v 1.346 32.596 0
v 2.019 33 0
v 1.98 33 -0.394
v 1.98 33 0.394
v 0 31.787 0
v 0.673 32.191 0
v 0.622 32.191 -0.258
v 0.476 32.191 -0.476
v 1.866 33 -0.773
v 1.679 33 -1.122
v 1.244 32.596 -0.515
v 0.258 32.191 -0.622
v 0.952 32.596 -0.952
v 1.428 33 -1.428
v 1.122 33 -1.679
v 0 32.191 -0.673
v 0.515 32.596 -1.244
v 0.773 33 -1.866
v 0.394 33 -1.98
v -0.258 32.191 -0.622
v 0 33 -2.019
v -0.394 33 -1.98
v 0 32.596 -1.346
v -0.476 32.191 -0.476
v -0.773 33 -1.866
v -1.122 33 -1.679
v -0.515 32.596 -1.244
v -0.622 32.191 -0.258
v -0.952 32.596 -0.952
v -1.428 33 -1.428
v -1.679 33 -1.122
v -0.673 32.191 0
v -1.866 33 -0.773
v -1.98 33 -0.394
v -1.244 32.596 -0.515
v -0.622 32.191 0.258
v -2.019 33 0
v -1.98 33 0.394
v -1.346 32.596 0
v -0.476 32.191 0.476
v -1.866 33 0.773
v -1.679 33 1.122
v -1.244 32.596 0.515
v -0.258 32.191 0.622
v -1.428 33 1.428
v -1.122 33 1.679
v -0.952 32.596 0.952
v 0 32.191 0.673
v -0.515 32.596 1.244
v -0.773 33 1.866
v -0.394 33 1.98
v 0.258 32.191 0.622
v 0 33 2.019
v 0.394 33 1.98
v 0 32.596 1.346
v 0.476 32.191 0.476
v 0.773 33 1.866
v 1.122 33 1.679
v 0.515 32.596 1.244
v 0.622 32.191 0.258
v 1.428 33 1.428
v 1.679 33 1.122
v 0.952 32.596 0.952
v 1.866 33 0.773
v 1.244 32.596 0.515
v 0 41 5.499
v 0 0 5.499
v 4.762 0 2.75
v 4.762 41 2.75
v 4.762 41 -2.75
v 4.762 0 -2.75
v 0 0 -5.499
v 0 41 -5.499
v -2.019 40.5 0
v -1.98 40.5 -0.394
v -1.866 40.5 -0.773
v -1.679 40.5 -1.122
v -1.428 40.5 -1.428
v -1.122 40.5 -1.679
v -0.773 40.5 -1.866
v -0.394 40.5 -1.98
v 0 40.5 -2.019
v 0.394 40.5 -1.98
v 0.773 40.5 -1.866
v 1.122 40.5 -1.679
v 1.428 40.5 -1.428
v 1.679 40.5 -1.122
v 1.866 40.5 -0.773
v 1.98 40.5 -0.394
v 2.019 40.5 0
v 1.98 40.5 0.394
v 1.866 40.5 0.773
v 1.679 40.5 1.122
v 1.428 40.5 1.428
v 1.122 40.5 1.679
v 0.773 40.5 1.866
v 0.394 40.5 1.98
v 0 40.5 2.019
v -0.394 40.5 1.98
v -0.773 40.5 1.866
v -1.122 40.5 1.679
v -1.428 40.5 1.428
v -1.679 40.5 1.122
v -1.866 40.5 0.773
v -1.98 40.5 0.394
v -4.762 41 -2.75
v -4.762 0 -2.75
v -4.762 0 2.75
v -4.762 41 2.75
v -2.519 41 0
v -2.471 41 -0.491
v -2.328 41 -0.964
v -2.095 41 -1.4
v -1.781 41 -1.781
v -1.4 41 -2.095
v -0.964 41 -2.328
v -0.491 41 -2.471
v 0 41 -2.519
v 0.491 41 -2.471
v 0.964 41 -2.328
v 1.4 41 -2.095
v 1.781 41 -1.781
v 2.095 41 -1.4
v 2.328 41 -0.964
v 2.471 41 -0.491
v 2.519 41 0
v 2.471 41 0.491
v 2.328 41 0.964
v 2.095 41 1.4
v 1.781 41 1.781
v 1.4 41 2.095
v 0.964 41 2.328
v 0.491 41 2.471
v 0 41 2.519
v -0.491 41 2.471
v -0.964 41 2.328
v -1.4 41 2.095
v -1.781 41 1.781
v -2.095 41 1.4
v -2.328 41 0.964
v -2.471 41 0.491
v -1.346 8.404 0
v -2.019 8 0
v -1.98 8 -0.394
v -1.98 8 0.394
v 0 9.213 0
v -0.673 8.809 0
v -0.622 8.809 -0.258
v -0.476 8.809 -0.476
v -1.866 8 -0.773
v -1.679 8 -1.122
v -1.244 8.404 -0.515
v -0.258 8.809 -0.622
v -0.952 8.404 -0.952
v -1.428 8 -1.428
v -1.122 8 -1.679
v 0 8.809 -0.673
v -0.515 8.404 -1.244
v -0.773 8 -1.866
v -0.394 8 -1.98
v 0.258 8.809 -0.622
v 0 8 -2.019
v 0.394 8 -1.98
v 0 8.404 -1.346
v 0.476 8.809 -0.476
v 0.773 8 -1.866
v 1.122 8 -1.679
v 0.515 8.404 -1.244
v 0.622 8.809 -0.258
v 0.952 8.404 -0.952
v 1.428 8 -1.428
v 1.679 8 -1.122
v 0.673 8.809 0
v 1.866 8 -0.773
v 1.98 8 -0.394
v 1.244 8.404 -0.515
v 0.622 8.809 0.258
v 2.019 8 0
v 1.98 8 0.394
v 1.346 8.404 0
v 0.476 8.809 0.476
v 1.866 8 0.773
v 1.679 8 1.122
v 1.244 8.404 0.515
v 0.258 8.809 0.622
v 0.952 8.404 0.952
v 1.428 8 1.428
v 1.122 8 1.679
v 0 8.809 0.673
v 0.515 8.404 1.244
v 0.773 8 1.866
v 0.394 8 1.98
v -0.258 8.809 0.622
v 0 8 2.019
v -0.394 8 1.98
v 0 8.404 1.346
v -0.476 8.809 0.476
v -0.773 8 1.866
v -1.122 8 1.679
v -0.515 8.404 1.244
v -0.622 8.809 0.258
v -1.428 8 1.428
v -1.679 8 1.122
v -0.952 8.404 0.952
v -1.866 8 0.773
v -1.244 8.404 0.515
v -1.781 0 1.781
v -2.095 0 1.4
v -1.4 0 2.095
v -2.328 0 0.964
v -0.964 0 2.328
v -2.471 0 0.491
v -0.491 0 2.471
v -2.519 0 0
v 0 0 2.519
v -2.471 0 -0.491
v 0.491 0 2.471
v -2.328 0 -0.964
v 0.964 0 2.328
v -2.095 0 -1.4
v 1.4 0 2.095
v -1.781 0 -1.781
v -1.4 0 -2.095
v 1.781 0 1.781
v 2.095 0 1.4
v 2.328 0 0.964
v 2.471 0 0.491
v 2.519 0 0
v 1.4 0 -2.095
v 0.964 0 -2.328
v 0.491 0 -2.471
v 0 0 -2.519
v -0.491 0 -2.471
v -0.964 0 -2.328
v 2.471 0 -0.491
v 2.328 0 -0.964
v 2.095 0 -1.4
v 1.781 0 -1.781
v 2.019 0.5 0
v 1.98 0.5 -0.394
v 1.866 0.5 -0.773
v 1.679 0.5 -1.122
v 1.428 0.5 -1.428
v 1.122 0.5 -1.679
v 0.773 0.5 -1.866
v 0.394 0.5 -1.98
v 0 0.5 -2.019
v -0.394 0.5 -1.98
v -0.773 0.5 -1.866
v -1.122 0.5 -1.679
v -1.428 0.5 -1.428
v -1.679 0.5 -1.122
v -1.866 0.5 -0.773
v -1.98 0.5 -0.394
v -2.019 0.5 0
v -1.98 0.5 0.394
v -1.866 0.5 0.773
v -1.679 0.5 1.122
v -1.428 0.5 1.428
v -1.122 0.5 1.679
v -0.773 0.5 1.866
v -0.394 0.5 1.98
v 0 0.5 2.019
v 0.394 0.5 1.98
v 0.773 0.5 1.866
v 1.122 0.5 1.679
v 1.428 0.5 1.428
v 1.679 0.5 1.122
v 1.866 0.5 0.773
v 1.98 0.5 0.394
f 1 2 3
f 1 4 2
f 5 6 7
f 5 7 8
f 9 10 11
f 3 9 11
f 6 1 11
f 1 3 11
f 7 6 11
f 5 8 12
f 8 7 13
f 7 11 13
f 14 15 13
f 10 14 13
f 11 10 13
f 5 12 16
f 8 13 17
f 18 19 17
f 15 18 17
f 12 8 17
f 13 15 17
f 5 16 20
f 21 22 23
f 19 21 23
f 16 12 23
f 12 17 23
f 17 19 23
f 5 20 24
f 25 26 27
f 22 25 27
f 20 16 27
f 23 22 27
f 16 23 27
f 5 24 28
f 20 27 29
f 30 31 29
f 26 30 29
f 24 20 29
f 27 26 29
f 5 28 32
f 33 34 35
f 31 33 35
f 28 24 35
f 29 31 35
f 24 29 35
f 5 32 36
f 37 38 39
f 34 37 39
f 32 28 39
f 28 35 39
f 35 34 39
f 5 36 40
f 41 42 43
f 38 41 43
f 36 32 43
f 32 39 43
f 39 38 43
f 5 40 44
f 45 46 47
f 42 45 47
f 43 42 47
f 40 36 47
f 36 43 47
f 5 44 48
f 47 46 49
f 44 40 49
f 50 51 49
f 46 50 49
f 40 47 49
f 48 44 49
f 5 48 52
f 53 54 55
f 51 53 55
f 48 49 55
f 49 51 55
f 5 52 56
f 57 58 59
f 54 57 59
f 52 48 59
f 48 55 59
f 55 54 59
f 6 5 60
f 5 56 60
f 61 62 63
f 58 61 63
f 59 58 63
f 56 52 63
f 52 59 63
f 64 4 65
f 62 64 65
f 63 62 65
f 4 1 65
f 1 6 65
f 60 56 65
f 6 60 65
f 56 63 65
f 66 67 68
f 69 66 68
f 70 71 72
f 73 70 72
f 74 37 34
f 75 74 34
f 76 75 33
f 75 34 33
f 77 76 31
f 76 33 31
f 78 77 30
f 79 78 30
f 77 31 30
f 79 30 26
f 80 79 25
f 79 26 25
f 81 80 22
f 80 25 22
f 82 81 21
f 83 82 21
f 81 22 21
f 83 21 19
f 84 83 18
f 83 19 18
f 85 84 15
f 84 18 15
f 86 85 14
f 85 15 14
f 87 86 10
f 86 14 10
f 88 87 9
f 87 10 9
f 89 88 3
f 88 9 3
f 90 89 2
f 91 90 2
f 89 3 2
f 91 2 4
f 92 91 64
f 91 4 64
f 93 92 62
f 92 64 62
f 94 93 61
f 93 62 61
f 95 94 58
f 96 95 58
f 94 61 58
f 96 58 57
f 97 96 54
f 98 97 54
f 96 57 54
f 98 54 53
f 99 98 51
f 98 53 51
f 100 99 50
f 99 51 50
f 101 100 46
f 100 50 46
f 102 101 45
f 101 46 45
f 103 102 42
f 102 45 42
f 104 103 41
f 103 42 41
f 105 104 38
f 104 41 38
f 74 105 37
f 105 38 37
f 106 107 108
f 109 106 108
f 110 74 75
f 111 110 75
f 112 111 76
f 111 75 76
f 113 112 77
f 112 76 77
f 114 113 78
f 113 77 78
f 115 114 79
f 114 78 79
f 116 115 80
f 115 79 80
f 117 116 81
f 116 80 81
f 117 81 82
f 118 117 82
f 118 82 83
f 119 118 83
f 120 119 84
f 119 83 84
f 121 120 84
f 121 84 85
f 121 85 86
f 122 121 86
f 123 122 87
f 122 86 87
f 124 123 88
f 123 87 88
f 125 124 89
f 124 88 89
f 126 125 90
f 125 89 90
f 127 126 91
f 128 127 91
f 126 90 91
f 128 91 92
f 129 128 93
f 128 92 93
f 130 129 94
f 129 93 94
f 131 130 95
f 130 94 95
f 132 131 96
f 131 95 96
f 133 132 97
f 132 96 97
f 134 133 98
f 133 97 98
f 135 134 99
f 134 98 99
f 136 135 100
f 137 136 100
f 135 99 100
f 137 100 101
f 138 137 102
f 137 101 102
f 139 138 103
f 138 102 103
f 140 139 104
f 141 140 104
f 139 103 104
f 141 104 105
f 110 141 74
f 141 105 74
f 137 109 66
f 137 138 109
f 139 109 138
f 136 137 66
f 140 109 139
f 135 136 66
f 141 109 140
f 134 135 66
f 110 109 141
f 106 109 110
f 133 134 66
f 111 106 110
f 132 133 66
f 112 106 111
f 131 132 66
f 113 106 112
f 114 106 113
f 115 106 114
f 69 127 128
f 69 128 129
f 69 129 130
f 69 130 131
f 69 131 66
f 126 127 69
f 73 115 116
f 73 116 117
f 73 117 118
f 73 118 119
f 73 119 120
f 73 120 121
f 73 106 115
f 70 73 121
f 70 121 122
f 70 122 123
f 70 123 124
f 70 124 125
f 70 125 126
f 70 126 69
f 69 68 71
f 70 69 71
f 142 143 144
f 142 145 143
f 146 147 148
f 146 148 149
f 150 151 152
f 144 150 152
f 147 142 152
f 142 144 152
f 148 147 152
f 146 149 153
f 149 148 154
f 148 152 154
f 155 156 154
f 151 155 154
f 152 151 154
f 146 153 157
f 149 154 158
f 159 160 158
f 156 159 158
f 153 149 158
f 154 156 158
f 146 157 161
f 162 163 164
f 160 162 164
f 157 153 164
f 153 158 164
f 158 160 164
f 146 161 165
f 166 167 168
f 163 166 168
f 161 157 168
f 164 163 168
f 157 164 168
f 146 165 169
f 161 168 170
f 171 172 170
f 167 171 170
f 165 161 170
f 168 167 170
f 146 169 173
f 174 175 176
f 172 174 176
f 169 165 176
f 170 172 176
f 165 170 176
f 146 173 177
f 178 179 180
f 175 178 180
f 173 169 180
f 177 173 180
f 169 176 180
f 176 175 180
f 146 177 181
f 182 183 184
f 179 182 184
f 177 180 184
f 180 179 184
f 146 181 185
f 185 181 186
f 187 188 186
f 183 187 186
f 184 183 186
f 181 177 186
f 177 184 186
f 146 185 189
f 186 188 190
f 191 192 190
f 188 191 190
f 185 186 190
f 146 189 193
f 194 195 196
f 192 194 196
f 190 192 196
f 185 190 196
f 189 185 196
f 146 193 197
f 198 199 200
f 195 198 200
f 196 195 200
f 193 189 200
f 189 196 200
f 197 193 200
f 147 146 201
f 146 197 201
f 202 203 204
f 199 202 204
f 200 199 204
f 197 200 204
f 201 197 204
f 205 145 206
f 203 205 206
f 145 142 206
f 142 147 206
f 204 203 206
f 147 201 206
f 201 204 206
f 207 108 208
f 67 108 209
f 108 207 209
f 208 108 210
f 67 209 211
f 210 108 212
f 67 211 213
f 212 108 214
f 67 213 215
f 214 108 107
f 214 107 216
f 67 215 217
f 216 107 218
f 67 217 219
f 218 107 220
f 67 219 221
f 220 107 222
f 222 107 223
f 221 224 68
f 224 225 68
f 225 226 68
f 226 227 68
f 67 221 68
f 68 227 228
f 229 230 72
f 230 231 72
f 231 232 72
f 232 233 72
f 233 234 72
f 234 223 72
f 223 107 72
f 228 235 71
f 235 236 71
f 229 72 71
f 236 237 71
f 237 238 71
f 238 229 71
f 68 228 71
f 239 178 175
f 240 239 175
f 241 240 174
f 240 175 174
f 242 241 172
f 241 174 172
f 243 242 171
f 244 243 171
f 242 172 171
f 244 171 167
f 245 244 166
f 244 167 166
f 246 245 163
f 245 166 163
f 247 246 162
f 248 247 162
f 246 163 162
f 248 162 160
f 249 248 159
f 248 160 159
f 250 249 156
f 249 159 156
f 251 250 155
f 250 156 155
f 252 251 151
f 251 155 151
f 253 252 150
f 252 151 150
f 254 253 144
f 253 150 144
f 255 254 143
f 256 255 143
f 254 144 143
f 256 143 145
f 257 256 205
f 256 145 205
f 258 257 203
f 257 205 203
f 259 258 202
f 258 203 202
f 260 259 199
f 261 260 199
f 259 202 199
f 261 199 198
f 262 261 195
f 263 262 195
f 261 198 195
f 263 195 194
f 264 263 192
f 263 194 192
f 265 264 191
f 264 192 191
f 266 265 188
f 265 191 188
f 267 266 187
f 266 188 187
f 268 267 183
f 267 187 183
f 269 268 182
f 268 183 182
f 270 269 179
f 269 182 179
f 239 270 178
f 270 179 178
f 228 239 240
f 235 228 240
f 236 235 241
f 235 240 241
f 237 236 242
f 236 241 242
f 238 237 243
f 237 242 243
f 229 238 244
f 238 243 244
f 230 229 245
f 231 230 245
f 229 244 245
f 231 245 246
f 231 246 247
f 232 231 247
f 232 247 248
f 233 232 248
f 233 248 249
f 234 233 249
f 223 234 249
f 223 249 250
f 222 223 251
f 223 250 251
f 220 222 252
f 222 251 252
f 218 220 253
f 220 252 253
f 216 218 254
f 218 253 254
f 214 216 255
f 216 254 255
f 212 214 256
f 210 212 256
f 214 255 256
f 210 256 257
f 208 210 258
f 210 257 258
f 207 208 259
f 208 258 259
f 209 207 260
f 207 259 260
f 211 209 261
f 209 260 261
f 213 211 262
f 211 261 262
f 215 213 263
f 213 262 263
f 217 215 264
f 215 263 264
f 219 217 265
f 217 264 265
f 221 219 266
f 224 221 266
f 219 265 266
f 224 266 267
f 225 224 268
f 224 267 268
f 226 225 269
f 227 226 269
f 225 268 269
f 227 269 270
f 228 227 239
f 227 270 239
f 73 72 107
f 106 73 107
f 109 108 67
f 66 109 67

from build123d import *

# Parameters (mm, degrees)
BOSS_EXTRUDE1_DEPTH        = 41
F_10_32_TAPPED_HOLE1_D     = 4.0386
F_10_32_TAPPED_HOLE1_DEPTH = 8
F_10_32_TAPPED_HOLE1_TIP   = 1.213317848
F_10_32_TAPPED_HOLE2_D     = 4.0386
F_10_32_TAPPED_HOLE2_DEPTH = 8
F_10_32_TAPPED_HOLE2_TIP   = 1.213317848
CHAMFER1_SIZE              = 0.5


with BuildPart() as part:
    # Sketch1 → Boss-Extrude1 (new body)
    with BuildSketch(Plane(origin=(0, 0, 0), x_dir=(1, 0, 0), z_dir=(0, 1, 0))):
        Polygon((0, -5.499261314), (4.7625, -2.749630657), (4.7625, 2.749630657), (0, 5.499261314), (-4.7625, 2.749630657), (-4.7625, -2.749630657), align=None)
    extrude(amount=BOSS_EXTRUDE1_DEPTH)

    # #10-32 Tapped Hole1
    with Locations(Plane(origin=(0, 41, 0), x_dir=(1, 0, 0), z_dir=(0, 1, 0))):
        with Locations((0, 0)):
            Hole(F_10_32_TAPPED_HOLE1_D / 2, depth=F_10_32_TAPPED_HOLE1_DEPTH)
            with Locations((0, 0, -(F_10_32_TAPPED_HOLE1_DEPTH + F_10_32_TAPPED_HOLE1_TIP / 2))):  # 118° drill point
                Cone(0, F_10_32_TAPPED_HOLE1_D / 2, F_10_32_TAPPED_HOLE1_TIP, mode=Mode.SUBTRACT)

    # #10-32 Tapped Hole2
    with Locations(Plane(origin=(0, 0, 0), x_dir=(-1, 0, 0), z_dir=(0, -1, 0))):
        with Locations((0, 0)):
            Hole(F_10_32_TAPPED_HOLE2_D / 2, depth=F_10_32_TAPPED_HOLE2_DEPTH)
            with Locations((0, 0, -(F_10_32_TAPPED_HOLE2_DEPTH + F_10_32_TAPPED_HOLE2_TIP / 2))):  # 118° drill point
                Cone(0, F_10_32_TAPPED_HOLE2_D / 2, F_10_32_TAPPED_HOLE2_TIP, mode=Mode.SUBTRACT)

    # Chamfer1
    chamfer1_edges = [part.edges().sort_by_distance(p)[0] for p in [
        (2.0193, 41, 0),
        (-2.0193, 0, 0),
    ]]
    chamfer(chamfer1_edges, length=CHAMFER1_SIZE)


solid = part.part
